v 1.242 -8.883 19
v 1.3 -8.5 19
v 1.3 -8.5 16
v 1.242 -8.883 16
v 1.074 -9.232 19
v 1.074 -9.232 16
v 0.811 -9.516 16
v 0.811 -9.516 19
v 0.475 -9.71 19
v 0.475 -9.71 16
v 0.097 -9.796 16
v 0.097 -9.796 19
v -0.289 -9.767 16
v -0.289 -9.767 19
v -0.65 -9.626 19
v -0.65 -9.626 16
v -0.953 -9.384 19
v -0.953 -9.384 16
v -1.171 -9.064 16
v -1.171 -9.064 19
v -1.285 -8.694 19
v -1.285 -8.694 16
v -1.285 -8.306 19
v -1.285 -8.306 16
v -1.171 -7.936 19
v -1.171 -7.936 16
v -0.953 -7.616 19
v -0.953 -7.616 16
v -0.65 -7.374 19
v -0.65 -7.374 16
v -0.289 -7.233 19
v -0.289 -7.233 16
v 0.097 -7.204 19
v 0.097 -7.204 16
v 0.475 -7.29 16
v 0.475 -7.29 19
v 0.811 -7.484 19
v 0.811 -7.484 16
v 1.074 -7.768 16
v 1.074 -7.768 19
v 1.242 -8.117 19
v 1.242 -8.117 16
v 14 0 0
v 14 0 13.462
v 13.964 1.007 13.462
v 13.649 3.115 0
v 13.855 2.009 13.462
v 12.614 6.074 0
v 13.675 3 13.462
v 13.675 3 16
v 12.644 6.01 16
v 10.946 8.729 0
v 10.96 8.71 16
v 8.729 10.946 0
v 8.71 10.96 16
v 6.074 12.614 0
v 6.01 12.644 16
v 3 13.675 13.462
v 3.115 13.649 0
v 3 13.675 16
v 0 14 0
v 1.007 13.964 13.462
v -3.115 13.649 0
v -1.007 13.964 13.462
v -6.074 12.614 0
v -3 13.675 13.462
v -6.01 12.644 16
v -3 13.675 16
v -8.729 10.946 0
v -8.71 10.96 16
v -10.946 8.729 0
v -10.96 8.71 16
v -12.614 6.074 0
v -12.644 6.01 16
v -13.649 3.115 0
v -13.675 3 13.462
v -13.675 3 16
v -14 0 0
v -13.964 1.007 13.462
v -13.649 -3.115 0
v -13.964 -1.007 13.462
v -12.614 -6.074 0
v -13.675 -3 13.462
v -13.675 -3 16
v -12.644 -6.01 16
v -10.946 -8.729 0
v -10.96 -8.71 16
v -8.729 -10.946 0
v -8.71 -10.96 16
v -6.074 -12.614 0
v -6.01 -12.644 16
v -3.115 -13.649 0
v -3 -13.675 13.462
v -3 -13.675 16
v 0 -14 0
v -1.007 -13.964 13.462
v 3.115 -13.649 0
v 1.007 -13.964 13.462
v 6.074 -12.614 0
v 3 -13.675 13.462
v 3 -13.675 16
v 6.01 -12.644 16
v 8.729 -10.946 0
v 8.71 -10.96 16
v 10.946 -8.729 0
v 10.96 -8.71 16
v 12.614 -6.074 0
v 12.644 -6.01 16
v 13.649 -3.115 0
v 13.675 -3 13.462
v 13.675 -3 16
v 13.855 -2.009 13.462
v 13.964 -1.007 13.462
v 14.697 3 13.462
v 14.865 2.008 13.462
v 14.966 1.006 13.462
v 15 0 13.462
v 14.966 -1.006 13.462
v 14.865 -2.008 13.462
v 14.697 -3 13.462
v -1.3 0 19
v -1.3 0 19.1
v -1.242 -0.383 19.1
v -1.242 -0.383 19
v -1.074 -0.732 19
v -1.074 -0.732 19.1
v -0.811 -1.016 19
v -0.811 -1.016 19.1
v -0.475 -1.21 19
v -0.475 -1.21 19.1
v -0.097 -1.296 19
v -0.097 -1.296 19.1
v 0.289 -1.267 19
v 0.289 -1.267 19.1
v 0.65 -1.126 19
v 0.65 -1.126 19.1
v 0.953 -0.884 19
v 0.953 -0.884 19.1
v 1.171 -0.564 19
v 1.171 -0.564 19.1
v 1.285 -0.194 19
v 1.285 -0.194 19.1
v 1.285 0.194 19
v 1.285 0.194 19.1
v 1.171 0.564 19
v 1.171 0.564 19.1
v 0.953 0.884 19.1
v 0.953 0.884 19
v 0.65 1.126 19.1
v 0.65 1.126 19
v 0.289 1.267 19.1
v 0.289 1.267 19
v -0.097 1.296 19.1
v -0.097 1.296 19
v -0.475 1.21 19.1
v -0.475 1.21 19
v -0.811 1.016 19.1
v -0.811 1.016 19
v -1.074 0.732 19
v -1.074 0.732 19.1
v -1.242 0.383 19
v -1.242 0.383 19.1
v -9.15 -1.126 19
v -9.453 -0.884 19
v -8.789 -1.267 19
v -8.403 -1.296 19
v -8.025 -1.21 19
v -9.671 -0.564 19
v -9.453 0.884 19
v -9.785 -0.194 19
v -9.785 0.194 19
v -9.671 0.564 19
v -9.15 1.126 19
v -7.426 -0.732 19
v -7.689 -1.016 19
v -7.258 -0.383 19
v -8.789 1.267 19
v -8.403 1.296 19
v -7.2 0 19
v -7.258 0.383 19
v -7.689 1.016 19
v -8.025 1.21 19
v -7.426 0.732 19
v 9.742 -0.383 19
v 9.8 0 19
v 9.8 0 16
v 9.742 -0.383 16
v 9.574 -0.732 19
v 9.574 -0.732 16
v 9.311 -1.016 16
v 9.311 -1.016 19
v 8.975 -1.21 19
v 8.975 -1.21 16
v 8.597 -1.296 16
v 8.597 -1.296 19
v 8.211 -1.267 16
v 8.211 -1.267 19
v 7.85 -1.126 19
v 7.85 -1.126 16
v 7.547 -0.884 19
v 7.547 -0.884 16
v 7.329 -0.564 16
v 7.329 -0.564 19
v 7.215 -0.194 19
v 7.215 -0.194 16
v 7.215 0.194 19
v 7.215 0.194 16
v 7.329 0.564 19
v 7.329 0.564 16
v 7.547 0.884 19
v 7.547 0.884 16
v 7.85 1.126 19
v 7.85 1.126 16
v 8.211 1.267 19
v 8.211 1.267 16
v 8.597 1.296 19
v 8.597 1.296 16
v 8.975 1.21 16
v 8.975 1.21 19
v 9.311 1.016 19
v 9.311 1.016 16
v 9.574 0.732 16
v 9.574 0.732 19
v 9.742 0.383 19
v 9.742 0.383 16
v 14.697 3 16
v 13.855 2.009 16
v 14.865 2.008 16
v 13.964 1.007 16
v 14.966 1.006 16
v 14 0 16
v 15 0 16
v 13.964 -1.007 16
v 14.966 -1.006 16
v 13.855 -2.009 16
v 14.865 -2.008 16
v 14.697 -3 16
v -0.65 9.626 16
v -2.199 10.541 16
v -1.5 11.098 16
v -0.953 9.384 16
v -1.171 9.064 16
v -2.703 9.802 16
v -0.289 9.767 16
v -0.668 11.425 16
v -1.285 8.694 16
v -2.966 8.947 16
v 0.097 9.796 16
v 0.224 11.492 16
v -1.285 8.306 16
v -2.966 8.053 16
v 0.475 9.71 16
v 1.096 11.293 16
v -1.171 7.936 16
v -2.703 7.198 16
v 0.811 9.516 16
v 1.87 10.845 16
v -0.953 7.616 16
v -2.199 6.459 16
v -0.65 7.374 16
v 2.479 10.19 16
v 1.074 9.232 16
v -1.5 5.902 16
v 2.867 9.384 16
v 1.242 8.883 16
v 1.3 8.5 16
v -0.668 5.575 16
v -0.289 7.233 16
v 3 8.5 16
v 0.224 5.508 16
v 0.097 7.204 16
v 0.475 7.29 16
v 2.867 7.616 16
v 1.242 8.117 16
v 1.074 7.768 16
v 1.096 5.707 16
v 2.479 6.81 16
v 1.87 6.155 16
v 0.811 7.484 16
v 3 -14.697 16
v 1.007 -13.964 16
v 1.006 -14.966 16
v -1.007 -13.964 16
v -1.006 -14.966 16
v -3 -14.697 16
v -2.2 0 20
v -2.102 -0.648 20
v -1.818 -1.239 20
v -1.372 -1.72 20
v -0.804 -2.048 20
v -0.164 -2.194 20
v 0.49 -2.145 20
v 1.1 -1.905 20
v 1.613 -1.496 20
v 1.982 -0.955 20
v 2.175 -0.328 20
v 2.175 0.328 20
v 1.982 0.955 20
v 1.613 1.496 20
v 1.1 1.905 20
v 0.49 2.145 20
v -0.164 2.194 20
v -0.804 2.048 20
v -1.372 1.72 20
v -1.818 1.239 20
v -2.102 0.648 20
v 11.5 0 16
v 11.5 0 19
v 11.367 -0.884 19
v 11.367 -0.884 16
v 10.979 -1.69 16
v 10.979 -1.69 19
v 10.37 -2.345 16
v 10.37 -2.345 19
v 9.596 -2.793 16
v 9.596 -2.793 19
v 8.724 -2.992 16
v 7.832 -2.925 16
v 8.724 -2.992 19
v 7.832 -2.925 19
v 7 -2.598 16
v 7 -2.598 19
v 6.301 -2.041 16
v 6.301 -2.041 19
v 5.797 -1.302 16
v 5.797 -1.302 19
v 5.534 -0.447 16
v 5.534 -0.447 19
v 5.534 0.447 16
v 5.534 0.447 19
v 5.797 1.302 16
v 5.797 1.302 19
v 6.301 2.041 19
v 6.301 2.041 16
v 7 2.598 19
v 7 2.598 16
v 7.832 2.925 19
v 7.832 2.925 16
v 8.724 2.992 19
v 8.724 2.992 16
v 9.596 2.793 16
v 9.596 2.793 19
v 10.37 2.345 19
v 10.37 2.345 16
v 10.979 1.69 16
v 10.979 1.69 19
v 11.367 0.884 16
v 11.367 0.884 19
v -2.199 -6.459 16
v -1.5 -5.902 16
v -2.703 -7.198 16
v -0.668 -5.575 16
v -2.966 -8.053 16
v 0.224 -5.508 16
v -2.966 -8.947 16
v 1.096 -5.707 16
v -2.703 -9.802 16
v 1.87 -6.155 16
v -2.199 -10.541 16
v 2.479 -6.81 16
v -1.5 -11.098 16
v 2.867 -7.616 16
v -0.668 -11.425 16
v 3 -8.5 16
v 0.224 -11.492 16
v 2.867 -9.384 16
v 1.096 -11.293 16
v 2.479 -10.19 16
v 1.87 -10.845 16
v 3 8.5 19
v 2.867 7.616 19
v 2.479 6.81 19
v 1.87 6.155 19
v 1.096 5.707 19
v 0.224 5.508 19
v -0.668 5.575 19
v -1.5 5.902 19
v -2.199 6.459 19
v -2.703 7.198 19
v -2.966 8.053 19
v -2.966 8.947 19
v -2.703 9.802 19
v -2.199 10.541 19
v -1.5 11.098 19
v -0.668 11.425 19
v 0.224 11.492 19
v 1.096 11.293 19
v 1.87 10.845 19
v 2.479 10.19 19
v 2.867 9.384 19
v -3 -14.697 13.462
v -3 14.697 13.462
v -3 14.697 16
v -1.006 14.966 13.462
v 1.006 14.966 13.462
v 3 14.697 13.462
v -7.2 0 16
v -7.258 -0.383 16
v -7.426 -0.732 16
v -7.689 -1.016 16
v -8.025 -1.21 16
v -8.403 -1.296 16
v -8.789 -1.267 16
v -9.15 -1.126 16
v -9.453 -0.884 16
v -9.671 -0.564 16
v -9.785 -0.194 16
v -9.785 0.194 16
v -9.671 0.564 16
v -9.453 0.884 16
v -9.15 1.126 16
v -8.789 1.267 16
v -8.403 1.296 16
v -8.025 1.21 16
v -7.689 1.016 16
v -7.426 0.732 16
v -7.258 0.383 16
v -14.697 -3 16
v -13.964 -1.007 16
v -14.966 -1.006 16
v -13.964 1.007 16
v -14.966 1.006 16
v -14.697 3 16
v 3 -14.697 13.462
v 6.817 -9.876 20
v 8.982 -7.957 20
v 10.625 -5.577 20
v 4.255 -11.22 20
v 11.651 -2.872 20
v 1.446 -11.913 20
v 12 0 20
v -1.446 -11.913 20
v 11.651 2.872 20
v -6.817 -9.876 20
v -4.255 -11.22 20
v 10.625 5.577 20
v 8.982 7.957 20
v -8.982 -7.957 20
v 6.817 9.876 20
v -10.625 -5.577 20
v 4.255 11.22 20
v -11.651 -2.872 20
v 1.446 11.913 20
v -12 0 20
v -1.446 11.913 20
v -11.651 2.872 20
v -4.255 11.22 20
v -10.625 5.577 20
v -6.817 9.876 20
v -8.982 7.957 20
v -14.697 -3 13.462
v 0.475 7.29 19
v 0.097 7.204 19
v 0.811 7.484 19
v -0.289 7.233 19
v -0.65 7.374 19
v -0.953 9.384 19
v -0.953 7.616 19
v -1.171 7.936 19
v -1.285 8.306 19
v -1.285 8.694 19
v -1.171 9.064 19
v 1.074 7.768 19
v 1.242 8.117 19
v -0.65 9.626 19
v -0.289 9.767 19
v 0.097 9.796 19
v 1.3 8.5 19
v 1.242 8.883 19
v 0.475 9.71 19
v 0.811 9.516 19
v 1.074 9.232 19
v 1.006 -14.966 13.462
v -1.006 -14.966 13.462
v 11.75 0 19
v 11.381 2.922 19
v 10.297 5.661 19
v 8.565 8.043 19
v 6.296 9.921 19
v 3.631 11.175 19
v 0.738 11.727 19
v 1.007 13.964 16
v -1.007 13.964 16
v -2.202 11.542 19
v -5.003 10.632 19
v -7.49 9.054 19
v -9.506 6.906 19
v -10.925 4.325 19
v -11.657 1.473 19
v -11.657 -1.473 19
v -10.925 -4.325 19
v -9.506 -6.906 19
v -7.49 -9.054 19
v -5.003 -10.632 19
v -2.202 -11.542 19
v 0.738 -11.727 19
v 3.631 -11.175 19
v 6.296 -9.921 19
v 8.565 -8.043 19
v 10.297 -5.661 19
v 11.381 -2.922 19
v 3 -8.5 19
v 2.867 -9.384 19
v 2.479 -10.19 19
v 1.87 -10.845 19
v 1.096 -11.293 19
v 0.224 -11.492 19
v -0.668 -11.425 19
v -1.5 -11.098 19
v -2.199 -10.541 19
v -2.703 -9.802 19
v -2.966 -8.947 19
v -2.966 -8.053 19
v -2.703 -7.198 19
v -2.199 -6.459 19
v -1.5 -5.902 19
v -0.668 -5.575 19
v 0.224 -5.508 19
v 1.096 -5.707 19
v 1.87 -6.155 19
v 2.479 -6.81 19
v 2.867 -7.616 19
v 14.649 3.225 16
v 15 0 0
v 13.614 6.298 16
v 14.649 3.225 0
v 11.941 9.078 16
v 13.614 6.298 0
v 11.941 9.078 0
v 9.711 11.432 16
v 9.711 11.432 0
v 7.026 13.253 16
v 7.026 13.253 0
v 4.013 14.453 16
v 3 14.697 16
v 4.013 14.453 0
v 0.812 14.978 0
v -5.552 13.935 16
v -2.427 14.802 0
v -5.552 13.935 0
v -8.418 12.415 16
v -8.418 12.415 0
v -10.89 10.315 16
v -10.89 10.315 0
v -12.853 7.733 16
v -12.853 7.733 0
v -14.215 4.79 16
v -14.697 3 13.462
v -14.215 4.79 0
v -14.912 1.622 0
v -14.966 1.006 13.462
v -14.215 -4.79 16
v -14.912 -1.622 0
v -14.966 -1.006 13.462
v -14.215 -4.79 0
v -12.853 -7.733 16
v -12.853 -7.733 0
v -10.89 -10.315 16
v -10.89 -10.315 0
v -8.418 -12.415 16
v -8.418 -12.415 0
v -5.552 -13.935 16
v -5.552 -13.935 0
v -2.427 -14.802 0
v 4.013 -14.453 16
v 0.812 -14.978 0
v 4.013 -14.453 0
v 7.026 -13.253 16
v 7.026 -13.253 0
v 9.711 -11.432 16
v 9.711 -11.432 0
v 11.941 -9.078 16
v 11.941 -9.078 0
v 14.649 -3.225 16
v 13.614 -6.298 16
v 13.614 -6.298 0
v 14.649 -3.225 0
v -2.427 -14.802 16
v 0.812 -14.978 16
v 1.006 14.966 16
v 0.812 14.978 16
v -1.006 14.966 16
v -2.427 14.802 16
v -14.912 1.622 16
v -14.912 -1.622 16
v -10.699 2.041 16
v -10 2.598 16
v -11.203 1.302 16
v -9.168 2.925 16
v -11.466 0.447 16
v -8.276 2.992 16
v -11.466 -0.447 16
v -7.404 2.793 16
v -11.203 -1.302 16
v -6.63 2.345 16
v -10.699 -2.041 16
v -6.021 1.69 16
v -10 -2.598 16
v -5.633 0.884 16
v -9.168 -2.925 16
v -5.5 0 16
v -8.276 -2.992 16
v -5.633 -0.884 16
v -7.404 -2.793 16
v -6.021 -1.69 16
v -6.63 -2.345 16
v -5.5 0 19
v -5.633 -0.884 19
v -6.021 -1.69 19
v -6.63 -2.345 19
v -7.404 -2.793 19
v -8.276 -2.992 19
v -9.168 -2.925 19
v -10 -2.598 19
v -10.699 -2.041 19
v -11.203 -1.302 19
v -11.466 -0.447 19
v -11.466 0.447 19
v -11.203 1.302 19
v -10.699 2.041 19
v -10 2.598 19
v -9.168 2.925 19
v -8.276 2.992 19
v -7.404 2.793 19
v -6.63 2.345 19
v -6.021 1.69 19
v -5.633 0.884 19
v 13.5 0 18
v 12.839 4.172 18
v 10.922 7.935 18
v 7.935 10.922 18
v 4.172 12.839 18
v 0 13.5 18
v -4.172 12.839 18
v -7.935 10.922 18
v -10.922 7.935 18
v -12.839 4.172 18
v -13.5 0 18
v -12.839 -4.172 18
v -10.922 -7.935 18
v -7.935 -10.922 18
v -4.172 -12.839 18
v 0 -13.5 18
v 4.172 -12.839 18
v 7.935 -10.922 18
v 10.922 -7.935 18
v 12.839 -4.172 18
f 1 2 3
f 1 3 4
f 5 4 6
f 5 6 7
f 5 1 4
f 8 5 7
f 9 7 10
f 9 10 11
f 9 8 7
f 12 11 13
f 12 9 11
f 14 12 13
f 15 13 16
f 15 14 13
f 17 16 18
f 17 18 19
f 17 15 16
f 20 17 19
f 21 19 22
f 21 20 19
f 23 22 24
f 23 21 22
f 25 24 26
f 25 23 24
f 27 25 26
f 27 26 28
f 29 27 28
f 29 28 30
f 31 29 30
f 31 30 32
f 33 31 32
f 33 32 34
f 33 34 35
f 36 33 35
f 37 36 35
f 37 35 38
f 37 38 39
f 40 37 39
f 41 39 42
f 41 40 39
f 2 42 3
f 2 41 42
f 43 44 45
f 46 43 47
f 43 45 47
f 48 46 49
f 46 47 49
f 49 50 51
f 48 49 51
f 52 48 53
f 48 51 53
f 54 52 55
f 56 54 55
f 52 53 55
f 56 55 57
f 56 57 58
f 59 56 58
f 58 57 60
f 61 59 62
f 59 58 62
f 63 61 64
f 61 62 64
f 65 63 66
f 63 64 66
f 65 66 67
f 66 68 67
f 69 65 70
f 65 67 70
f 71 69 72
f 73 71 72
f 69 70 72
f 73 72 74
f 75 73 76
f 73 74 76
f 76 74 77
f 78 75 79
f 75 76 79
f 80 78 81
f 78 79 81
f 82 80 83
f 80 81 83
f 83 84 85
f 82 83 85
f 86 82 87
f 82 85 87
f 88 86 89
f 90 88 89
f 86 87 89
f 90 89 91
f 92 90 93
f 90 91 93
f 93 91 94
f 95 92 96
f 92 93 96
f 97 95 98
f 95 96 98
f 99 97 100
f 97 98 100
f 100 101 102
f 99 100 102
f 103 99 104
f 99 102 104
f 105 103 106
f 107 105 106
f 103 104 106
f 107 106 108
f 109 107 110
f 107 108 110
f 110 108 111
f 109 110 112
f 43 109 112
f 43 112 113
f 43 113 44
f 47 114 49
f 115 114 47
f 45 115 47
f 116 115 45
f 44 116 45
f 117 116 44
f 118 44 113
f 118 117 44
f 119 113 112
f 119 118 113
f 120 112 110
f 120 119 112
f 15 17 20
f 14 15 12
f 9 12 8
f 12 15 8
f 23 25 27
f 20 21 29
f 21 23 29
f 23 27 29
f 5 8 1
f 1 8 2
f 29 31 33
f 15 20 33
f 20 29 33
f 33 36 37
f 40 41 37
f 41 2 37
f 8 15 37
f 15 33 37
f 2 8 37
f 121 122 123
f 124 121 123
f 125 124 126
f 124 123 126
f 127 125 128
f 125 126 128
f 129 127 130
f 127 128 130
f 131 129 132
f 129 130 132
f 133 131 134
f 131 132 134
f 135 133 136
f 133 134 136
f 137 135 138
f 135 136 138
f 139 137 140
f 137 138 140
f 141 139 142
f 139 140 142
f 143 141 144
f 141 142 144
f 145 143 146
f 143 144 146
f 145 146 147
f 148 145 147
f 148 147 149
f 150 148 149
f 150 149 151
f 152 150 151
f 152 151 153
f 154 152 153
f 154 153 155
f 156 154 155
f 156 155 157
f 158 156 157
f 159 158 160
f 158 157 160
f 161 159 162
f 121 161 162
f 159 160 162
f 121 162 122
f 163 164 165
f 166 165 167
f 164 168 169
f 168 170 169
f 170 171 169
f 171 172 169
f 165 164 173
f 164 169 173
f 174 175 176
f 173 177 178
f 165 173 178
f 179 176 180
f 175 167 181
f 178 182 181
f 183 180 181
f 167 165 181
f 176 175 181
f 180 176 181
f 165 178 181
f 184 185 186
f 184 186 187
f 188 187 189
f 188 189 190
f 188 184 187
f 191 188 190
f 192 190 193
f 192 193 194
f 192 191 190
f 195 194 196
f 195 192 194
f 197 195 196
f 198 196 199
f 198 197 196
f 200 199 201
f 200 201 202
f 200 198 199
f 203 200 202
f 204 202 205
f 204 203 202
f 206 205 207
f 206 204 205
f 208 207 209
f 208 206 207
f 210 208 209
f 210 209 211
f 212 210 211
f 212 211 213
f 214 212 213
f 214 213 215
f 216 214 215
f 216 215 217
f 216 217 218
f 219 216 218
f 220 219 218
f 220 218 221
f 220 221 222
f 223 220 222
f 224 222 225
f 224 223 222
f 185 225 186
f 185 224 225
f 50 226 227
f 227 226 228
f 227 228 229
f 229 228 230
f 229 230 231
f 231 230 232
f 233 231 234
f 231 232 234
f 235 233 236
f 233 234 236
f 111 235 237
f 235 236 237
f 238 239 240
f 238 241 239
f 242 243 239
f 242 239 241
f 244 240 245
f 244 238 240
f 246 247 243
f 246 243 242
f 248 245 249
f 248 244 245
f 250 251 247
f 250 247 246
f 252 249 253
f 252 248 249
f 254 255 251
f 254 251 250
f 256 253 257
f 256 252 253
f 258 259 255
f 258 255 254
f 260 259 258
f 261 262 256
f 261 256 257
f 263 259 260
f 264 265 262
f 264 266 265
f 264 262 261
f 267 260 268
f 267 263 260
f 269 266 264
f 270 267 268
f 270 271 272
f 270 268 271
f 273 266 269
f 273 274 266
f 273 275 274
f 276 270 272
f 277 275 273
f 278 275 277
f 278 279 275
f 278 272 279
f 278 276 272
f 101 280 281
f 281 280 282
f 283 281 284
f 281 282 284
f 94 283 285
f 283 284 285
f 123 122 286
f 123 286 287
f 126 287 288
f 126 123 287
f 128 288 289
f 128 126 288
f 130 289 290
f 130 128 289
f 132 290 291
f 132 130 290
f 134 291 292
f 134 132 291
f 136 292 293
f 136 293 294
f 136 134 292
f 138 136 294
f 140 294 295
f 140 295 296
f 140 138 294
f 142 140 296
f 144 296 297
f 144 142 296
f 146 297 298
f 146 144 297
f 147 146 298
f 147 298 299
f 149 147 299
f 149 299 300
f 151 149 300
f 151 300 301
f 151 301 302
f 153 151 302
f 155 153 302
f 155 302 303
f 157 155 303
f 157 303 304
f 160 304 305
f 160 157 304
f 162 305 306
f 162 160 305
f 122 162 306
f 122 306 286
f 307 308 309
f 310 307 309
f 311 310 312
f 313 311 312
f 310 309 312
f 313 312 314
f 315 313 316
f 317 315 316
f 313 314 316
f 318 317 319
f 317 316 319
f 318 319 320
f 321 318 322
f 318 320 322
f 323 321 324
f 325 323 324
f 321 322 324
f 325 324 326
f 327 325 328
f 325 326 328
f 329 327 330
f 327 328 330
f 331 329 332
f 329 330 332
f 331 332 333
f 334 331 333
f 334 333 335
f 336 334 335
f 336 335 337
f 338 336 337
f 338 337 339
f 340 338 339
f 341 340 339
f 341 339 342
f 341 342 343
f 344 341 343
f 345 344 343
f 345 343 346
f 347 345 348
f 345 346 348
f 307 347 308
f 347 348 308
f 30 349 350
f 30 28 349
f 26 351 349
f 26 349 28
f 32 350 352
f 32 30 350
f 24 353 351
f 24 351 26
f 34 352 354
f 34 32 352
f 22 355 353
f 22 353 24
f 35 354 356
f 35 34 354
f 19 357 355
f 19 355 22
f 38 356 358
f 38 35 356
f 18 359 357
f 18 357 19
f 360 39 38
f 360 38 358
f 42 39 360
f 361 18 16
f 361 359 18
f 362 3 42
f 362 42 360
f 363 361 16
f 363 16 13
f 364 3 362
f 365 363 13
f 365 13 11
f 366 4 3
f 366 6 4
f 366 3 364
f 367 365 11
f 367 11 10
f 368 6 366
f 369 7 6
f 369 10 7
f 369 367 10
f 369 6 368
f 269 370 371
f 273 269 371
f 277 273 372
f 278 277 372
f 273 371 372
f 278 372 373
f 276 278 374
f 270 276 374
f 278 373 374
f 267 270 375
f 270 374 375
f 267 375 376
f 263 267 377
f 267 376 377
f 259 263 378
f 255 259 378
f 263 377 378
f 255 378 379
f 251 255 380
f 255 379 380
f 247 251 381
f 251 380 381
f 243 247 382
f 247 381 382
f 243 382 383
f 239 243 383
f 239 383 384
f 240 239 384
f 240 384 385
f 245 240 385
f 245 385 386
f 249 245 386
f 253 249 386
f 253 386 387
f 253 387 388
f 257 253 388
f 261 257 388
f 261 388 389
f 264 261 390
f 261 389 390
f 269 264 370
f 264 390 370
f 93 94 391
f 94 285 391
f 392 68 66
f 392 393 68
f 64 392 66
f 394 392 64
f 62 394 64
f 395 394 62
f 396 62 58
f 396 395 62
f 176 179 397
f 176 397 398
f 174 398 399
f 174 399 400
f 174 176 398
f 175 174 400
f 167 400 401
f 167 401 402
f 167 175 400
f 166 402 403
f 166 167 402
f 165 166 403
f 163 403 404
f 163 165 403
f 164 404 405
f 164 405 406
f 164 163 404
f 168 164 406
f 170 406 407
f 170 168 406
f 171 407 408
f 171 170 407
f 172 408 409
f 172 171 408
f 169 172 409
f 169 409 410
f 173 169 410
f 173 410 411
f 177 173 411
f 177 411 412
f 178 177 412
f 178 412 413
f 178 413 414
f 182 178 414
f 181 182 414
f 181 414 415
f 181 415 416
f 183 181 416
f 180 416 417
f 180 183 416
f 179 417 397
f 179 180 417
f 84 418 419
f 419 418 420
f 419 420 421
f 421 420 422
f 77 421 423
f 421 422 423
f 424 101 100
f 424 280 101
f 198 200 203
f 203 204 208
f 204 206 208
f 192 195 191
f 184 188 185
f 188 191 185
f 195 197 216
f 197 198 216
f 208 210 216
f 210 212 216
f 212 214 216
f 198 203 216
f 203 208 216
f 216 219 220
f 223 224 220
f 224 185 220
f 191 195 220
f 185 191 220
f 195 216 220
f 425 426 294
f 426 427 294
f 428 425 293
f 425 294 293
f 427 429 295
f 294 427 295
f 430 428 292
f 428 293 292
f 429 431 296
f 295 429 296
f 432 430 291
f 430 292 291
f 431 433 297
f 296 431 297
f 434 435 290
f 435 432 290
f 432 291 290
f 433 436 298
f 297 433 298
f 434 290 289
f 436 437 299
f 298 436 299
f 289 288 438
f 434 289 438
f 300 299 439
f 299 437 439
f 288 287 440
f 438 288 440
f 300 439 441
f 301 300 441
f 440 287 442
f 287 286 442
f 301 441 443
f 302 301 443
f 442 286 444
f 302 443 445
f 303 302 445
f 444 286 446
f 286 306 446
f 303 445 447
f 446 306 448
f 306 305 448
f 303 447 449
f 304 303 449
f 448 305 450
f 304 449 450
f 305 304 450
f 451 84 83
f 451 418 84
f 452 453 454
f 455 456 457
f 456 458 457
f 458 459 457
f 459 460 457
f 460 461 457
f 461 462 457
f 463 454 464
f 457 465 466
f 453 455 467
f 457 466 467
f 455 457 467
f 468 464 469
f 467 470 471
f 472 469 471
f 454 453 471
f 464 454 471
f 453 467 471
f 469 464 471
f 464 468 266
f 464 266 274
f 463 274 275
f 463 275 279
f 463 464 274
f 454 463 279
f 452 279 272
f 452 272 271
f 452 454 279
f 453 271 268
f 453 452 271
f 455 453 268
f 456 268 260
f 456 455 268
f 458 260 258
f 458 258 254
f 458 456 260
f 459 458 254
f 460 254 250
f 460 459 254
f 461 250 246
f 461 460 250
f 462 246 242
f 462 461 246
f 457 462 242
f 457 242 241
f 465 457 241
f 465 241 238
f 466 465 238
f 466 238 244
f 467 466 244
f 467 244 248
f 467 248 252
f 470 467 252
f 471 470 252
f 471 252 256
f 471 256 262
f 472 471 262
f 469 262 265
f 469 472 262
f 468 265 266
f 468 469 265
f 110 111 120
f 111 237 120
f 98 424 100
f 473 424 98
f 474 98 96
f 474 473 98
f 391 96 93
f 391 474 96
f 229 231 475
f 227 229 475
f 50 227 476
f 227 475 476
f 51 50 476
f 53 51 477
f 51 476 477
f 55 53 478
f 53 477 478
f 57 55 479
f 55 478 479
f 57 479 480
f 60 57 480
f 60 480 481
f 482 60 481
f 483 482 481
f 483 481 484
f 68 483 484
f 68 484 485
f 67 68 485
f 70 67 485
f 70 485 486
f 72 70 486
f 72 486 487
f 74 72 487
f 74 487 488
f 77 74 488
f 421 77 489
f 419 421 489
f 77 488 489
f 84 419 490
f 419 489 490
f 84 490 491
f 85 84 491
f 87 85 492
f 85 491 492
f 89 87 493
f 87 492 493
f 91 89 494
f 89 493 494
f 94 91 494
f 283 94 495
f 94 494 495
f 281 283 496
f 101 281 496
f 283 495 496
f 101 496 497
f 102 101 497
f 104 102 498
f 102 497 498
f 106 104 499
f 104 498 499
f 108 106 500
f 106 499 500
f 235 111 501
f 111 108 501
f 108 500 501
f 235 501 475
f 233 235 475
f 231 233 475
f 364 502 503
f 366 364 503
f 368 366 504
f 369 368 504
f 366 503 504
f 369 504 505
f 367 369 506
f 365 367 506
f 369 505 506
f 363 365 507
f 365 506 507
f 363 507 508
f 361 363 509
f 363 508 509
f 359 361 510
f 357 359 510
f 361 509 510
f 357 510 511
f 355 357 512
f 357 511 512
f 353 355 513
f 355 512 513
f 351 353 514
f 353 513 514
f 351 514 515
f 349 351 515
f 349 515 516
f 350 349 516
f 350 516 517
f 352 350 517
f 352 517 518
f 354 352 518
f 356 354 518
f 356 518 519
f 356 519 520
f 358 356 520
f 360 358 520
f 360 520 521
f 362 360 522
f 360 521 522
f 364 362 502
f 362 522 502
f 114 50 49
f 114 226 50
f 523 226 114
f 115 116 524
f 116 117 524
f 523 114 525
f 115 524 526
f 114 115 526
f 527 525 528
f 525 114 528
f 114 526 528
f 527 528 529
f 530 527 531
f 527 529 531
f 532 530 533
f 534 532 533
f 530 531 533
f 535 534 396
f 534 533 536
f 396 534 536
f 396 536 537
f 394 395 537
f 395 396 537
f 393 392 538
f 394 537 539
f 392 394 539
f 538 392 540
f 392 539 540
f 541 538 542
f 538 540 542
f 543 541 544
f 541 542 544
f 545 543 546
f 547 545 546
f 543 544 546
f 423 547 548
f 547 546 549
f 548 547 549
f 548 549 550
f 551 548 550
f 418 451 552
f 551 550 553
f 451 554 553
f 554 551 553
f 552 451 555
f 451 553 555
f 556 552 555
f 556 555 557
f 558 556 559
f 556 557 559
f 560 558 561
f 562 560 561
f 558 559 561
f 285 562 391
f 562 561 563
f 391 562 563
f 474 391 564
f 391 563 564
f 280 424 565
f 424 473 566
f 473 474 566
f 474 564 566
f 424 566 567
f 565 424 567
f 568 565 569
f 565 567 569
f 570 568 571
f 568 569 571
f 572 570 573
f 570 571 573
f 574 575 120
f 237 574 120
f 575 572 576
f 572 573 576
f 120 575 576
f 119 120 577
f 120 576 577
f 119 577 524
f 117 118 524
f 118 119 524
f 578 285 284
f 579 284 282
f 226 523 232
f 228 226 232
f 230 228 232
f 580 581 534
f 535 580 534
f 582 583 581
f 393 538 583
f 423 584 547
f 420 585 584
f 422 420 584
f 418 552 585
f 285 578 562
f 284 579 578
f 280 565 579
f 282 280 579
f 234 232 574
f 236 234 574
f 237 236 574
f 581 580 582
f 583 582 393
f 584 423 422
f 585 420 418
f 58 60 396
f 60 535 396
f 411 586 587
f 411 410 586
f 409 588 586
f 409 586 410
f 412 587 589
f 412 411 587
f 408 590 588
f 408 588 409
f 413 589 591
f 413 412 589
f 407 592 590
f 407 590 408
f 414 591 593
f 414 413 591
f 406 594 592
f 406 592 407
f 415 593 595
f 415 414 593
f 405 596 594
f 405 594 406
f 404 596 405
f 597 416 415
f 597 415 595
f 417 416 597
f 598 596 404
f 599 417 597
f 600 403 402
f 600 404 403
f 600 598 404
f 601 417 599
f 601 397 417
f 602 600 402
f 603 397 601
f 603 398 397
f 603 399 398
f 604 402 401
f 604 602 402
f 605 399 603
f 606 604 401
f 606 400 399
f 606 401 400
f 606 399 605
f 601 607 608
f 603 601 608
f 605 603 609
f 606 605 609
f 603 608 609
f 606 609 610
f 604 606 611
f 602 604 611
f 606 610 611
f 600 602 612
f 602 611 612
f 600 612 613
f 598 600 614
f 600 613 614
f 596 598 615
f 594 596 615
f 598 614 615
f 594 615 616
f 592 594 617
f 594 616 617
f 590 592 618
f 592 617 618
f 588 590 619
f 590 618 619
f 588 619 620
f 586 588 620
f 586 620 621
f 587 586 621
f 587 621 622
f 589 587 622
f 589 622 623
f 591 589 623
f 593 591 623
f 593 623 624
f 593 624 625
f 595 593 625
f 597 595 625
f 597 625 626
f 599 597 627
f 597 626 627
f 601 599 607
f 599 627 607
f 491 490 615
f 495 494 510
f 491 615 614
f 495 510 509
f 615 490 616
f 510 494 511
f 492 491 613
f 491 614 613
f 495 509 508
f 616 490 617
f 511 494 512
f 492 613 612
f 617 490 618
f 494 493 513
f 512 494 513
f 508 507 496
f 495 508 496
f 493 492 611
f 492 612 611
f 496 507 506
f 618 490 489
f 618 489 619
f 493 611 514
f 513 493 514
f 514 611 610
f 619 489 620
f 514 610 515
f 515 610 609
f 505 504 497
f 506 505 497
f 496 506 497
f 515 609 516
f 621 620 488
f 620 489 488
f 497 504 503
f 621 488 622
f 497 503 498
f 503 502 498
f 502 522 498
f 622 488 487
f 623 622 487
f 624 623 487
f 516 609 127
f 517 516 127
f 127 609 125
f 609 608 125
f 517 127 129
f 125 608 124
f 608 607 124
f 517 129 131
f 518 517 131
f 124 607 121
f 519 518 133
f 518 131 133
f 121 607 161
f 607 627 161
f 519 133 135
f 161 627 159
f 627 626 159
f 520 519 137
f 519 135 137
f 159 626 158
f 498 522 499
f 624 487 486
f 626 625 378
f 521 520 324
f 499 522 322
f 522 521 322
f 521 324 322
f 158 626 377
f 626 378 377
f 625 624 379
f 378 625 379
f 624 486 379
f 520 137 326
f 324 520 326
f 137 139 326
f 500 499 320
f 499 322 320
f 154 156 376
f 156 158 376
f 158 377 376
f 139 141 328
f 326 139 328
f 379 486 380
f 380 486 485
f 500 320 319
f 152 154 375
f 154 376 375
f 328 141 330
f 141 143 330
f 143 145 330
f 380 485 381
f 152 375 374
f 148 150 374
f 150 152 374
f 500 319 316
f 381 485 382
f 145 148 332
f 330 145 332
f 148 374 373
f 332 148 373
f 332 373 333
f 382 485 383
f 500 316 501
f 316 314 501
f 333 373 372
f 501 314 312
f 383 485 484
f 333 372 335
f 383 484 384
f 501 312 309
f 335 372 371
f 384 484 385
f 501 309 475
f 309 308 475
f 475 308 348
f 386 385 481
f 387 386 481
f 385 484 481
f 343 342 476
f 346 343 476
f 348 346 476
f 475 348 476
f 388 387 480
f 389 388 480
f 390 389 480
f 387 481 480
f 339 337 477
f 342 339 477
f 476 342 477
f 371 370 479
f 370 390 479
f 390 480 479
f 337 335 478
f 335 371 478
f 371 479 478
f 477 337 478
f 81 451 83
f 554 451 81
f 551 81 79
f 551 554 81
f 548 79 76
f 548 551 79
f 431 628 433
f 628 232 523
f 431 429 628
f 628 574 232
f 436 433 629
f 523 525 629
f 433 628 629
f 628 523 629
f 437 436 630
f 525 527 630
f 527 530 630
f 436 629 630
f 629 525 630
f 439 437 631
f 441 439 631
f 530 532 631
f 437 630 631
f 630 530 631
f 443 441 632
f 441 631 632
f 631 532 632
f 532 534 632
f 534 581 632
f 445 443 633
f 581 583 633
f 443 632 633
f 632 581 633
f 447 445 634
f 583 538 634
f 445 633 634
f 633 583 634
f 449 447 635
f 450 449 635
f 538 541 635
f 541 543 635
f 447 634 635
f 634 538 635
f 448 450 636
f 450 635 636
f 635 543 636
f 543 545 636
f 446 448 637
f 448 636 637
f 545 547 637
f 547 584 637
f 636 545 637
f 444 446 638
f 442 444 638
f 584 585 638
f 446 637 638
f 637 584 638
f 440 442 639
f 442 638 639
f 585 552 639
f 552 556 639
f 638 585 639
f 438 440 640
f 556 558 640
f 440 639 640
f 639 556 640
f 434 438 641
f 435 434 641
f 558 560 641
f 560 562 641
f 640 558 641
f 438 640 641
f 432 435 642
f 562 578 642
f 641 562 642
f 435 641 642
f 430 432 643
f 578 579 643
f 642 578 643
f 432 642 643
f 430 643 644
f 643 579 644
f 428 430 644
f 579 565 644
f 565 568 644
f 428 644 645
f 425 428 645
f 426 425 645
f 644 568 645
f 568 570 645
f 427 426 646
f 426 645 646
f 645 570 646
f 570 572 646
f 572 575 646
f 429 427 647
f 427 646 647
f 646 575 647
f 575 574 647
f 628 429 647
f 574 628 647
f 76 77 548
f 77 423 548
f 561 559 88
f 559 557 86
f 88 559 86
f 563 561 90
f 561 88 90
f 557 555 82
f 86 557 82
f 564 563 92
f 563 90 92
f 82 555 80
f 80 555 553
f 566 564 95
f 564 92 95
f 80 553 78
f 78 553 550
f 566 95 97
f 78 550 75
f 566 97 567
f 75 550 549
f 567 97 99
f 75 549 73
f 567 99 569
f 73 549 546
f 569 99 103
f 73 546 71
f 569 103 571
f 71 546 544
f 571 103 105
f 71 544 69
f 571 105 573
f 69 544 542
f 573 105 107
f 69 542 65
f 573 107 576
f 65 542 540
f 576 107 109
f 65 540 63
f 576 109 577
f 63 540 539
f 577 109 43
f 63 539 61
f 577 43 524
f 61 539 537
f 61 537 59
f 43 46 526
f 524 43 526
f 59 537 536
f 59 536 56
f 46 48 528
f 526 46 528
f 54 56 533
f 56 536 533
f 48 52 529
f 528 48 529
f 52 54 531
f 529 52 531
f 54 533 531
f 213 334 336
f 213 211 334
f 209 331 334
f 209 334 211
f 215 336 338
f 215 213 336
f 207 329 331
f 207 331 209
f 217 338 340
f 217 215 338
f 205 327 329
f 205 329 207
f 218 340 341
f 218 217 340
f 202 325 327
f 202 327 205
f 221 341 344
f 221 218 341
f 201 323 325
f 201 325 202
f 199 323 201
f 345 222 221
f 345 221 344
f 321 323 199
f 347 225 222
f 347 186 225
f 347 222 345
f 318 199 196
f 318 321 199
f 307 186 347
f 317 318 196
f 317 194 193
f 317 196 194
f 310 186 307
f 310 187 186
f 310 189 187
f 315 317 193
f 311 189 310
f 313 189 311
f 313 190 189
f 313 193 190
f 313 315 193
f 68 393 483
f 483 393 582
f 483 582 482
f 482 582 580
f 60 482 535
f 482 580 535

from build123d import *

# Parameters (mm, degrees)
SKETCH_R           = 1.3
POCKET_DEPTH       = 1
SKETCH002_W        = 6
SKETCH002_H        = 2.537703
POCKET001_DEPTH    = 3
POLARPATTERN_COUNT = 4
SKETCH003_R        = 3
SKETCH003_R_2      = 1.3
PAD_DEPTH          = 3
CHAMFER_SIZE       = 0.9


with BuildPart() as part:
    # Sketch001 → Revolution (revolve)
    with BuildSketch(Plane.XZ):
        Polygon((0, 20), (12, 20), (15, 16), (15, 0), (14, 0), (14, 15.999992), (11.749994, 19), (0, 19), align=None)
    revolve(axis=Axis((0, 0, 0), (0, 0, 1)))

    # Sketch (on Face1 of Revolution) → Pocket (cut)
    with BuildSketch(Plane(origin=(0, 0, 20), x_dir=(-1, 0, 0), z_dir=(0, 0, 1))):
        Circle(SKETCH_R)
    extrude(amount=-POCKET_DEPTH, mode=Mode.SUBTRACT)

    # Sketch002 (on DatumPlane) → Pocket001 (cut)
    with BuildSketch(Plane(origin=(0, 15, 8), x_dir=(1, 0, 0), z_dir=(0, 1, 0))):
        with Locations((0, -6.731148)):
            Rectangle(SKETCH002_W, SKETCH002_H)
    pocket001 = extrude(amount=-POCKET001_DEPTH, mode=Mode.SUBTRACT)

    # PolarPattern: Pocket001 ×4 about axis
    polarpattern_axis = Axis((0, 0, 0), (0, 0, 1))
    for i in range(1, POLARPATTERN_COUNT):
        add(pocket001.rotate(polarpattern_axis, i * 360 / POLARPATTERN_COUNT), mode=Mode.SUBTRACT)

    # Sketch003 (on Face9 of PolarPattern) → Pad (join)
    with BuildSketch(Plane(origin=(0, 0, 19), x_dir=(1, 0, 0), z_dir=(0, 0, -1))):
        with Locations((-8.5, 0)):
            Circle(SKETCH003_R)
        with Locations((-8.5, 0)):
            Circle(SKETCH003_R_2, mode=Mode.SUBTRACT)
        with Locations((0, 8.5)):
            Circle(SKETCH003_R)
        with Locations((0, 8.5)):
            Circle(SKETCH003_R_2, mode=Mode.SUBTRACT)
        with Locations((8.5, 0)):
            Circle(SKETCH003_R)
        with Locations((8.5, 0)):
            Circle(SKETCH003_R_2, mode=Mode.SUBTRACT)
        with Locations((0, -8.5)):
            Circle(SKETCH003_R)
        with Locations((0, -8.5)):
            Circle(SKETCH003_R_2, mode=Mode.SUBTRACT)
    extrude(amount=PAD_DEPTH)

    # Chamfer
    chamfer_edges = [part.edges().sort_by_distance(p)[0] for p in [
        (1.3, 0, 20),
    ]]
    chamfer(chamfer_edges, length=CHAMFER_SIZE)


solid = part.part
